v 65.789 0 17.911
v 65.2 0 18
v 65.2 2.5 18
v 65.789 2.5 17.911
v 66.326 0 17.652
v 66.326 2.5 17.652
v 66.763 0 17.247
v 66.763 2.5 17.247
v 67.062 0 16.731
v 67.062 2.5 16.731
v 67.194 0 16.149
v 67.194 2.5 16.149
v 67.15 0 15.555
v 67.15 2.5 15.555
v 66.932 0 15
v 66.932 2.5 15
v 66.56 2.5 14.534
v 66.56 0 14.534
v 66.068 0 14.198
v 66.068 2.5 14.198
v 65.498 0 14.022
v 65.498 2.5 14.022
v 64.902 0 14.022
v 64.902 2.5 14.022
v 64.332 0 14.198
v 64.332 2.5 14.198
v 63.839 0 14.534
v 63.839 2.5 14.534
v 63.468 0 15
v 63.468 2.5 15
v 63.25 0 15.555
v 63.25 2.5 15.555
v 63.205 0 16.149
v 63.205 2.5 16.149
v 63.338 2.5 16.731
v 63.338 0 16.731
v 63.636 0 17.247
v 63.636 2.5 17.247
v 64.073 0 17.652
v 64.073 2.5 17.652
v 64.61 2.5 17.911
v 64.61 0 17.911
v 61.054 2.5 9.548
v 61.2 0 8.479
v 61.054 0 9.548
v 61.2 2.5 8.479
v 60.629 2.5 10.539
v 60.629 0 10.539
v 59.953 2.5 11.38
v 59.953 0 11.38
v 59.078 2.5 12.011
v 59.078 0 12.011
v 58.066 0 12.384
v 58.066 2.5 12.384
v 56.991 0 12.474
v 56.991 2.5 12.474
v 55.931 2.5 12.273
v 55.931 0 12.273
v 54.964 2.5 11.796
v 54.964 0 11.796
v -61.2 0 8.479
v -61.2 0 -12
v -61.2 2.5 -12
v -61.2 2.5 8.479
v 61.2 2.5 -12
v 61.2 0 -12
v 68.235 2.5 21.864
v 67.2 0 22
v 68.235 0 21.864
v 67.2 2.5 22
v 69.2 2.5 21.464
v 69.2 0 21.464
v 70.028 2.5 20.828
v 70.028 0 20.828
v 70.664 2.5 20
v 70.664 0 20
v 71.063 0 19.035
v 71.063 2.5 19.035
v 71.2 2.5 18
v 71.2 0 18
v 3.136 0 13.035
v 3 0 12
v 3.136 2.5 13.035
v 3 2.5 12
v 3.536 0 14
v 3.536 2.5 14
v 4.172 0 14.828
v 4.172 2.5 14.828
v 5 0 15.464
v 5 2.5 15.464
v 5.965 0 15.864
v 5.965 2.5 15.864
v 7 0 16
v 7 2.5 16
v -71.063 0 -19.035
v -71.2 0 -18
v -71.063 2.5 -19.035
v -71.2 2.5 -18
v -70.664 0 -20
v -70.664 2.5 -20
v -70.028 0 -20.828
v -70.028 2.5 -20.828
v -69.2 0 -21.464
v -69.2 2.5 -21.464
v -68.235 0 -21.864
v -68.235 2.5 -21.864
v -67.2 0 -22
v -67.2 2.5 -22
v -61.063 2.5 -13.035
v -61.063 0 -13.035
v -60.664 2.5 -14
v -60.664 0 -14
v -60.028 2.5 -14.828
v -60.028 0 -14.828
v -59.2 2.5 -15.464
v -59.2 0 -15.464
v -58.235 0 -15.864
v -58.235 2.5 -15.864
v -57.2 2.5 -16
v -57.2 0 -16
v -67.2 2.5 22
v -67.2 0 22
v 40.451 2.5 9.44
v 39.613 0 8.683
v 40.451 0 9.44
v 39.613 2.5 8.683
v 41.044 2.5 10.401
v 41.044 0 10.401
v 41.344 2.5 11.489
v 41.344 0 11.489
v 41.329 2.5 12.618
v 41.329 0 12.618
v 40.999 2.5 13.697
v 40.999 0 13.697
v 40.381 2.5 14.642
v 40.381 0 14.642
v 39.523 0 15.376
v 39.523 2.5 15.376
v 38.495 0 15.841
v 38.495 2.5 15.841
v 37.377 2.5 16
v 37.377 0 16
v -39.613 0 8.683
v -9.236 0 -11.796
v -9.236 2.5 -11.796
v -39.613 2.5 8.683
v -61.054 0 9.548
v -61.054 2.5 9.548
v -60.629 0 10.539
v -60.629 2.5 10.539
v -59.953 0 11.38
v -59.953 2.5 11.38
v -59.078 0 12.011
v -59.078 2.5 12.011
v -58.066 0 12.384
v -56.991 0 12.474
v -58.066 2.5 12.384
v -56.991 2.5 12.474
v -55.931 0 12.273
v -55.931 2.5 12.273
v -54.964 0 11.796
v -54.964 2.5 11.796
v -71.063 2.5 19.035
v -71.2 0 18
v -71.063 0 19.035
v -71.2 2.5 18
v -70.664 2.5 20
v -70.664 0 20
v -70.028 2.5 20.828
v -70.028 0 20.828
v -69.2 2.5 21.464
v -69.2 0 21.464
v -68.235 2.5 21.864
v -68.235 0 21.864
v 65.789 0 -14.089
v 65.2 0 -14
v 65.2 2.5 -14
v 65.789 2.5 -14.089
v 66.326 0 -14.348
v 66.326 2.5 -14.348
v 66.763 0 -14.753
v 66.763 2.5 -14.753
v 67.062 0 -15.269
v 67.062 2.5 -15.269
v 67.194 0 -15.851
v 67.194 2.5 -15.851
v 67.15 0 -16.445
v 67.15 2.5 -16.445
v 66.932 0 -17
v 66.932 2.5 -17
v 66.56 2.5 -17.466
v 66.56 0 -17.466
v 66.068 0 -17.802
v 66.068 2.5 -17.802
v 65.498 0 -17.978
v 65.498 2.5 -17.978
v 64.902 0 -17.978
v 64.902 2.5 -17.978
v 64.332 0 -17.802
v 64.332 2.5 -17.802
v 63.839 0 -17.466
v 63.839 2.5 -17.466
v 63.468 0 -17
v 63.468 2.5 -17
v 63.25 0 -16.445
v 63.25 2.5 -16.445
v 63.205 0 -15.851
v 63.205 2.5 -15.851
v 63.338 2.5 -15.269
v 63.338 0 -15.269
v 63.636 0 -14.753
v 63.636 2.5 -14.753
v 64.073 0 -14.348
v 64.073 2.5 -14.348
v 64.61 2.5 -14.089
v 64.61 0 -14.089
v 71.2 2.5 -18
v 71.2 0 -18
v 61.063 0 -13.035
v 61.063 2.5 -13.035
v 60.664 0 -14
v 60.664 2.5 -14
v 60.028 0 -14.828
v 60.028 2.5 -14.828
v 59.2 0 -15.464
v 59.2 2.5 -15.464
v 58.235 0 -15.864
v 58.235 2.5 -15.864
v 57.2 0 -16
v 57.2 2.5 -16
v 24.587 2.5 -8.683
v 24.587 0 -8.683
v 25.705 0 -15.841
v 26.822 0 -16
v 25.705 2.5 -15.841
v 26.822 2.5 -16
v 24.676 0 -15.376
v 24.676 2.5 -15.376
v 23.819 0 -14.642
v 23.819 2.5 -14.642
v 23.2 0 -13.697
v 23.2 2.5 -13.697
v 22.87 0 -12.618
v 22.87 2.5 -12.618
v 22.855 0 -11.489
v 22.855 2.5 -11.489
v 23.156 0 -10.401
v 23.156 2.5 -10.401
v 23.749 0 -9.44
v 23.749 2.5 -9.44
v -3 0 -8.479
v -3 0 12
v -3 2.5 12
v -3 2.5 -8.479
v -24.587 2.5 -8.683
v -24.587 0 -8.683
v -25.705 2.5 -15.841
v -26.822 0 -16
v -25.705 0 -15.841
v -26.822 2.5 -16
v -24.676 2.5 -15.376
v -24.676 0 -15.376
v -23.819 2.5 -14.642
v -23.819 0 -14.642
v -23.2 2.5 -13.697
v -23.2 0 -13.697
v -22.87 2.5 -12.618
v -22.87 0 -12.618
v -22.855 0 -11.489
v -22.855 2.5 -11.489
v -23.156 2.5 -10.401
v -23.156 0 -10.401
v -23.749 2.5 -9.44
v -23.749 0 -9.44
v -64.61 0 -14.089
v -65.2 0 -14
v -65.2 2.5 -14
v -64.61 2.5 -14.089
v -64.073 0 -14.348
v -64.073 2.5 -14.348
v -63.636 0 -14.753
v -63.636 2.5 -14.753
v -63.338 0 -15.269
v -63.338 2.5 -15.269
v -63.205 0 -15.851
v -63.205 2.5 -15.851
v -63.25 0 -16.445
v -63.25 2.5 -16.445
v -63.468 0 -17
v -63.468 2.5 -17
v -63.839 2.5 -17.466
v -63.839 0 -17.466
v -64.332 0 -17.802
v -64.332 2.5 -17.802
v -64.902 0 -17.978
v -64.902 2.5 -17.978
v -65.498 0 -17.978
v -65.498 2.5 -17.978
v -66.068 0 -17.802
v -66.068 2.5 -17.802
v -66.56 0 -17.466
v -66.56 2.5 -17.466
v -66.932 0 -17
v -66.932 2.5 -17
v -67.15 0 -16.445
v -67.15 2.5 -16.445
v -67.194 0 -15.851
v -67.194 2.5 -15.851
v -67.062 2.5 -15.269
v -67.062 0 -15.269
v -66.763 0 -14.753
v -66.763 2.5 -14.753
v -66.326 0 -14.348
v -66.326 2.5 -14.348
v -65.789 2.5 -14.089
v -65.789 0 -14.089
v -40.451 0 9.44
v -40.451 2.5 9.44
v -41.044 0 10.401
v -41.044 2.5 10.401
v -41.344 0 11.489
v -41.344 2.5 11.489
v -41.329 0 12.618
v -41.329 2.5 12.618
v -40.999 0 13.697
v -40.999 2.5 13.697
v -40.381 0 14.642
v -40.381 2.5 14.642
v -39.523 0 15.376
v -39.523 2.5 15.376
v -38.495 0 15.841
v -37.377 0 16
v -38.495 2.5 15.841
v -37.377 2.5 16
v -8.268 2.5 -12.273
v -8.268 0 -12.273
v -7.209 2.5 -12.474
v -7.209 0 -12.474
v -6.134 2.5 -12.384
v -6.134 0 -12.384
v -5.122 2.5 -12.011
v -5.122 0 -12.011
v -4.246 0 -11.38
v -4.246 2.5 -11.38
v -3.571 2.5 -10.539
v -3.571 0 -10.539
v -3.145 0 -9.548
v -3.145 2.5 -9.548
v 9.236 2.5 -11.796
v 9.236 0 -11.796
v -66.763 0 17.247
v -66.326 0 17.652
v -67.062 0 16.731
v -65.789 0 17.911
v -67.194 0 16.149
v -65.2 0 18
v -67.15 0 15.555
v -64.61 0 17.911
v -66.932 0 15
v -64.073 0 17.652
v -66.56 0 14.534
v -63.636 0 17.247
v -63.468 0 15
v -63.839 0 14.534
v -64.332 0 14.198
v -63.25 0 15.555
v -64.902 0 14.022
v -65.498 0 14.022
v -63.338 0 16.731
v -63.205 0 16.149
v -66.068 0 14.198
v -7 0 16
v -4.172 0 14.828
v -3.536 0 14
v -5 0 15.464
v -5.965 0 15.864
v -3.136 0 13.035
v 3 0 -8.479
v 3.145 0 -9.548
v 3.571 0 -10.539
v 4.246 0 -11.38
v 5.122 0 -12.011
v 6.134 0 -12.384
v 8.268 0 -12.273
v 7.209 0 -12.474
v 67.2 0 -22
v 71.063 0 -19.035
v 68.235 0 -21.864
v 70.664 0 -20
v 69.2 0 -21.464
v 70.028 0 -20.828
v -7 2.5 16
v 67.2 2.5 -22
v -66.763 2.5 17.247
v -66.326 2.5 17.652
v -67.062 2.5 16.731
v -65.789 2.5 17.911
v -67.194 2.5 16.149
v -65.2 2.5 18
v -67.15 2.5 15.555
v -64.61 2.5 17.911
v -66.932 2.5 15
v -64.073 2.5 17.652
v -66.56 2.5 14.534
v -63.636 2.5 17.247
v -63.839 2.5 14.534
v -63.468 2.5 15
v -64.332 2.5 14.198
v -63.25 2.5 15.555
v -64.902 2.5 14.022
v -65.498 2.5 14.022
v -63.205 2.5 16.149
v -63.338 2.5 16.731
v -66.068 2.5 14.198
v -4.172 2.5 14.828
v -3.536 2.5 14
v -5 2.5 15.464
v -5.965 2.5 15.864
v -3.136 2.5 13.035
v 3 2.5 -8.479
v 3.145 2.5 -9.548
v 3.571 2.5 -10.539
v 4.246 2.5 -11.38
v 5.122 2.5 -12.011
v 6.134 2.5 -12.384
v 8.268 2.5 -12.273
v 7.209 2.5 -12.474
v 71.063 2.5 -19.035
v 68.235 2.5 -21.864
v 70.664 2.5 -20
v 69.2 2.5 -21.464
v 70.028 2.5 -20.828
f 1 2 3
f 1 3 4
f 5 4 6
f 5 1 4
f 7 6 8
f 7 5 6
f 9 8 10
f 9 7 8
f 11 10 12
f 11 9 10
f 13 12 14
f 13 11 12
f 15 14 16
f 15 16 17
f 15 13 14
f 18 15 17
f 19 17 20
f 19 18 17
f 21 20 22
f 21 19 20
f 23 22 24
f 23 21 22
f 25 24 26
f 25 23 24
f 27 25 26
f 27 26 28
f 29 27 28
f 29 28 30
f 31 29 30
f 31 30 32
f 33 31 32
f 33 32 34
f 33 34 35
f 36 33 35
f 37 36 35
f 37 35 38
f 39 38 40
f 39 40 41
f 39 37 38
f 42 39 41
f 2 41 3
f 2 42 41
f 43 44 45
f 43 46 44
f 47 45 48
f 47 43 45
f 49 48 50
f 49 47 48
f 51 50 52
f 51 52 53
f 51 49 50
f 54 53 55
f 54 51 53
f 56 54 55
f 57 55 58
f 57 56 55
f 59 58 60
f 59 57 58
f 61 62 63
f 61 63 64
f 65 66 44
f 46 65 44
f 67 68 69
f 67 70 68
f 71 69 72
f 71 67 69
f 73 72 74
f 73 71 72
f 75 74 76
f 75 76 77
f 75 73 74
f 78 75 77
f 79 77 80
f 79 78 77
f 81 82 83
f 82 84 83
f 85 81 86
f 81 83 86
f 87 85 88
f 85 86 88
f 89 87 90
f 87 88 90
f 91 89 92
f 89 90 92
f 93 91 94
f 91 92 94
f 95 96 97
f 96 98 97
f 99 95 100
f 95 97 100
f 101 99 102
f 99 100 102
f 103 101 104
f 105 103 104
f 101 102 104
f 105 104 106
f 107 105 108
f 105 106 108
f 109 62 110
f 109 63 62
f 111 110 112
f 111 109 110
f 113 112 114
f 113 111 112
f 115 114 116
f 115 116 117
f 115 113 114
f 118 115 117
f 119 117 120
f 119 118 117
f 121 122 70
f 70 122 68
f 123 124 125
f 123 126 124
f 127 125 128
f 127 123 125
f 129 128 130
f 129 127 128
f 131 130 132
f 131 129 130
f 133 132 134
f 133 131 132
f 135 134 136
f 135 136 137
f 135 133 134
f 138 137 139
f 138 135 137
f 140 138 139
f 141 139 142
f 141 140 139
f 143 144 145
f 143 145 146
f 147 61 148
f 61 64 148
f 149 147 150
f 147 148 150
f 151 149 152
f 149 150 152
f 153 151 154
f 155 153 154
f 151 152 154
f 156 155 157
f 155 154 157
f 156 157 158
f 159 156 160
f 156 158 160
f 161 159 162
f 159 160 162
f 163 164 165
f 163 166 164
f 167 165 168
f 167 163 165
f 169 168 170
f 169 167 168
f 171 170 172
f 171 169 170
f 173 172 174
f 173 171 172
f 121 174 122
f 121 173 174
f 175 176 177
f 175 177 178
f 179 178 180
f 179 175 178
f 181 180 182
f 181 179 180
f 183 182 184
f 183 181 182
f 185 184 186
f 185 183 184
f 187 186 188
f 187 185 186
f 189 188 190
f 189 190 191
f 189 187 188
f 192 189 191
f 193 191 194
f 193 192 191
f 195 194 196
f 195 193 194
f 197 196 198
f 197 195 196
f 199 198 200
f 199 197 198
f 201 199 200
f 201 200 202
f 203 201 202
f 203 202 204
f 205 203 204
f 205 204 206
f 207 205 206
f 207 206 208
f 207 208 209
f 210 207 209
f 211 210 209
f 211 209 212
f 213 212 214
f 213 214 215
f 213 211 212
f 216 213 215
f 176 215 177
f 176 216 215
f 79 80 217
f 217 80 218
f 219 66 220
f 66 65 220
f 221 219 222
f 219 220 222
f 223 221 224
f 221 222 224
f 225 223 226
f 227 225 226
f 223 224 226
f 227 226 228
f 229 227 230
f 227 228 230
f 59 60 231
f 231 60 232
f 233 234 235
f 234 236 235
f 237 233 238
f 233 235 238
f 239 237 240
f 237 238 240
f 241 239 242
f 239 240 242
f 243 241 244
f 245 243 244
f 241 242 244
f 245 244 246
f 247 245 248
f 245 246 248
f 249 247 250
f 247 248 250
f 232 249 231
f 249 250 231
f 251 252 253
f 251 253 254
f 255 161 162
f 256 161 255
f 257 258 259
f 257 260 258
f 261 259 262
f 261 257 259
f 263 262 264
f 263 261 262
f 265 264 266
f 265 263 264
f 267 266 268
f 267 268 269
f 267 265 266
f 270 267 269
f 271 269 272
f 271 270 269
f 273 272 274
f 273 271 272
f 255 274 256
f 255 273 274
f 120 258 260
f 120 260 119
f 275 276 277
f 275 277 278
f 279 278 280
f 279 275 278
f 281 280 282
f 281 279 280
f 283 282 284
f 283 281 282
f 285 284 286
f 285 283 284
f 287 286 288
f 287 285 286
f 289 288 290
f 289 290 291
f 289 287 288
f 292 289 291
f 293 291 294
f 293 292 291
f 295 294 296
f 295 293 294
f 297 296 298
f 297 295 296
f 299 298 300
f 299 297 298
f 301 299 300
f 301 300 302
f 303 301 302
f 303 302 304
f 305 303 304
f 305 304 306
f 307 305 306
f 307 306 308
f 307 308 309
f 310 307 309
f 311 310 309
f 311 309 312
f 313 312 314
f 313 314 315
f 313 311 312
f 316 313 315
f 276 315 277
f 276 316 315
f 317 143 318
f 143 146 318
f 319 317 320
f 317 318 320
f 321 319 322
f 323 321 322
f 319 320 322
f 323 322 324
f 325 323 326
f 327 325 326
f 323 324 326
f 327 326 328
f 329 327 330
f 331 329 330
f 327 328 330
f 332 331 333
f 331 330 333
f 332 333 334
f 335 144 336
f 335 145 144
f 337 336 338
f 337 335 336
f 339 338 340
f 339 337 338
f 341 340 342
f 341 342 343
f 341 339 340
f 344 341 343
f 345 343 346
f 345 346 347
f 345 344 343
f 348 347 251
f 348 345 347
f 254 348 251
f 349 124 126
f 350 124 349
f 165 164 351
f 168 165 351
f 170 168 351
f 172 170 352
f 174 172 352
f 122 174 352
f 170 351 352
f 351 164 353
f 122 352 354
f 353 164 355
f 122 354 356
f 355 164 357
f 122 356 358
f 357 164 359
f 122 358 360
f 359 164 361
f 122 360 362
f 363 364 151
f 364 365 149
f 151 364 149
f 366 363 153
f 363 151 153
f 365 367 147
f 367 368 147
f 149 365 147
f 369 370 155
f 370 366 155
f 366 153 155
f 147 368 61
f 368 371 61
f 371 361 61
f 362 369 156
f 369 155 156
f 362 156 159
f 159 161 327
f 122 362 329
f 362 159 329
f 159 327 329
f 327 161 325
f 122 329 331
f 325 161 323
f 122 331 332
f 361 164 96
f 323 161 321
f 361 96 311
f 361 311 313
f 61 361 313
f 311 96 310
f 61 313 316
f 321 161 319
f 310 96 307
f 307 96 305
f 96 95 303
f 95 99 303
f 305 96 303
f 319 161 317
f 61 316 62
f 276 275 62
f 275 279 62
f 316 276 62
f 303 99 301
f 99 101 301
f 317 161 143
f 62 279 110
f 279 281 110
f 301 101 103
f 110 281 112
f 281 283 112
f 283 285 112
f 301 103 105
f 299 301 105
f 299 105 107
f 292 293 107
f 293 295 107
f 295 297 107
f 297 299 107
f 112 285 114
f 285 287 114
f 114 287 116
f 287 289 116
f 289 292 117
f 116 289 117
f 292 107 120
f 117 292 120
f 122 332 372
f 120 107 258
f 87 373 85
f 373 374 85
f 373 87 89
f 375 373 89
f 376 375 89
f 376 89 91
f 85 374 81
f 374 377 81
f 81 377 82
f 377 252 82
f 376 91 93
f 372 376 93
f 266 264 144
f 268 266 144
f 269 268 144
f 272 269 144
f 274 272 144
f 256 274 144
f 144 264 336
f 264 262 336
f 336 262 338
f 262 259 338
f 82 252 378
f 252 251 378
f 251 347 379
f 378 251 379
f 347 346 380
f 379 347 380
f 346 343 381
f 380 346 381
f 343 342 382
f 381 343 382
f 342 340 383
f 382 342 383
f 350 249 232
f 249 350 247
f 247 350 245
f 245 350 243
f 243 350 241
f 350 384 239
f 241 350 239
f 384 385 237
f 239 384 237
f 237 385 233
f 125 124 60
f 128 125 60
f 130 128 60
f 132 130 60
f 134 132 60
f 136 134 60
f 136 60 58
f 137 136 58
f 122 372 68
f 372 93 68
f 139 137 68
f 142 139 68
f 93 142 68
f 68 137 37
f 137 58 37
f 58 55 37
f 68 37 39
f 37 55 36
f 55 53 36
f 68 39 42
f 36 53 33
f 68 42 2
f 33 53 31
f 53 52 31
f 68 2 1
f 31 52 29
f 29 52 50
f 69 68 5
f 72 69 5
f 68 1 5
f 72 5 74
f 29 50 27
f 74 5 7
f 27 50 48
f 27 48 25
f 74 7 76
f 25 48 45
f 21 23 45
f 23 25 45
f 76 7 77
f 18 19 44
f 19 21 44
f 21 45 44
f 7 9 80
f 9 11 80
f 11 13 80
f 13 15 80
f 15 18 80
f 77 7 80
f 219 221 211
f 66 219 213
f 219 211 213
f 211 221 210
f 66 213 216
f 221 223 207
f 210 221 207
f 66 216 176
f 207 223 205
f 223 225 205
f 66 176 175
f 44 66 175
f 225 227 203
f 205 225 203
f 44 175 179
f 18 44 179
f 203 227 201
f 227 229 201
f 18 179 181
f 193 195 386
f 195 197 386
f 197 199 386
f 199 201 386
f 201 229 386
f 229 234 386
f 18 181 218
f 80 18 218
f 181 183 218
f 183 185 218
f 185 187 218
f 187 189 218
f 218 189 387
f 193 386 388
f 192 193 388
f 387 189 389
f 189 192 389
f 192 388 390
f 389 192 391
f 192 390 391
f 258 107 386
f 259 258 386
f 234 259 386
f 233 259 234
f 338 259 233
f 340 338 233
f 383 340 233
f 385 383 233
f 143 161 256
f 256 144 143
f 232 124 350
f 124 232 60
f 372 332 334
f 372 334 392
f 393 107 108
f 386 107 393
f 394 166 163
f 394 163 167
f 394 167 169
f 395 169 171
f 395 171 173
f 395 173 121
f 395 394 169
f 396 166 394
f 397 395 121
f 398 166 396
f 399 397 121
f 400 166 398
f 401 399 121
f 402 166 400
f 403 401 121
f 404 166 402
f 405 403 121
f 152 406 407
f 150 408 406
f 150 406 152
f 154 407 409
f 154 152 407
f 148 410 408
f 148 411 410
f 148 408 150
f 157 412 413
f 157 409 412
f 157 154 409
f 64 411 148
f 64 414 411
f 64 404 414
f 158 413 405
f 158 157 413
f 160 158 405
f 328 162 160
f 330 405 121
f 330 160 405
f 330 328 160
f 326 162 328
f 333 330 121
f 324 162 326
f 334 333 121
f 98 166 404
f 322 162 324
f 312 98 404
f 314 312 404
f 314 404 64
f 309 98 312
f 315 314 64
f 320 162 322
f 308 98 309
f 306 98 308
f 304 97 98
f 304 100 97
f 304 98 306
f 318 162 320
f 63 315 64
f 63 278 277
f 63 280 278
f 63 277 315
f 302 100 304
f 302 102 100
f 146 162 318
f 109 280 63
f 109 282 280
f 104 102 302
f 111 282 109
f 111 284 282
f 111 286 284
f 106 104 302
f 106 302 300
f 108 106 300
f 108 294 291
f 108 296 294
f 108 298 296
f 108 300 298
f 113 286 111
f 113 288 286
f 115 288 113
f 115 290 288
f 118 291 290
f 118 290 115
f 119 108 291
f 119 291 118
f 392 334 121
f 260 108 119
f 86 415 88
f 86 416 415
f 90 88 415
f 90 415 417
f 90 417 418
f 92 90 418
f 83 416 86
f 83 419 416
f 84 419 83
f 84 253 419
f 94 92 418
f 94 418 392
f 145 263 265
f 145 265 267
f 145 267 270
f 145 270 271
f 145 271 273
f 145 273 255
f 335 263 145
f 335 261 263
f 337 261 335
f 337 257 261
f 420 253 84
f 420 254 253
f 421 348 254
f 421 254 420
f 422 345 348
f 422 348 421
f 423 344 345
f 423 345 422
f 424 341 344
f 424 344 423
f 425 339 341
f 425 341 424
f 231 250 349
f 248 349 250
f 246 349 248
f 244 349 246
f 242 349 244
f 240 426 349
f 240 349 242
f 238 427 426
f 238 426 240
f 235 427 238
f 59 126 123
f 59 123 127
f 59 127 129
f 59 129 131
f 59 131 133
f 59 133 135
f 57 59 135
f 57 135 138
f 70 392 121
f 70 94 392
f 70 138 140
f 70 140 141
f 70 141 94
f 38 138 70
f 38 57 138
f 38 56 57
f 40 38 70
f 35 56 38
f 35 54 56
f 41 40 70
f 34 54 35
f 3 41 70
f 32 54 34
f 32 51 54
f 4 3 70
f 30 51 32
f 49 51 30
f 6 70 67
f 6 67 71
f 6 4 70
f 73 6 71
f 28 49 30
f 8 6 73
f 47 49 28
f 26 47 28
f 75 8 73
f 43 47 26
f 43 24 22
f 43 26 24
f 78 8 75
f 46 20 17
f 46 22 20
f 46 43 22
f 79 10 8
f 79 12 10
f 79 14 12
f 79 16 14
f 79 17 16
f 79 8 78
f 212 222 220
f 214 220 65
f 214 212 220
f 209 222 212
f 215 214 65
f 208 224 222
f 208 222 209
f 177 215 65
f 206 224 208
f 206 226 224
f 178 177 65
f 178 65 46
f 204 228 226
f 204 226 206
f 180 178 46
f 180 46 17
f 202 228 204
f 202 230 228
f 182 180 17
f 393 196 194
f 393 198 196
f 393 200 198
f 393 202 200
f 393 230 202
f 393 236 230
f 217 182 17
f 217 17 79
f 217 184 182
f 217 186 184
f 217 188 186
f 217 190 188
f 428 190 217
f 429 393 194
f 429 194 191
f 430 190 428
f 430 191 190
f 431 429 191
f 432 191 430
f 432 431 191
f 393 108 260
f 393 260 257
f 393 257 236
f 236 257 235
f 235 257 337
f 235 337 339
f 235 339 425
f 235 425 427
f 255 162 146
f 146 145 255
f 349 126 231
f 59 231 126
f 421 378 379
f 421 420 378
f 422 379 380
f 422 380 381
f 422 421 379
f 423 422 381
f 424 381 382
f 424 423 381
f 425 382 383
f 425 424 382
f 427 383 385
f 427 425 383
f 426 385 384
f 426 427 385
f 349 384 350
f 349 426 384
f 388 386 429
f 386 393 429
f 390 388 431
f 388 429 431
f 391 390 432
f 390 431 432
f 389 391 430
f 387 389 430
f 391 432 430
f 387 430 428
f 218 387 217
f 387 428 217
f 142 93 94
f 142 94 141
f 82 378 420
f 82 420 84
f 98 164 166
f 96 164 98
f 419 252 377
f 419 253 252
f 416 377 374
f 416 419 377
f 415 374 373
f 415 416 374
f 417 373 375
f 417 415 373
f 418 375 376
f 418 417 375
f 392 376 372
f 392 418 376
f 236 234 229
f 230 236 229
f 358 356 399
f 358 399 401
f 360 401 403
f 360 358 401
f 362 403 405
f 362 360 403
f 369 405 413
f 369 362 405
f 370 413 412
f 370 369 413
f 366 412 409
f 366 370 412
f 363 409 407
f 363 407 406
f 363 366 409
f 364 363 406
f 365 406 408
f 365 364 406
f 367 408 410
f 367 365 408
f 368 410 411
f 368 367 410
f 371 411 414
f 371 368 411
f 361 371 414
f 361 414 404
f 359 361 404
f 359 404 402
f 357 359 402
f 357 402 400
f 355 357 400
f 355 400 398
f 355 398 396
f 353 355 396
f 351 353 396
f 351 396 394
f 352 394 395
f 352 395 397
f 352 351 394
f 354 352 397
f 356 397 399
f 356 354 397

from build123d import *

# Parameters (mm, degrees)
SKETCH1_W           = 142.3995226
SKETCH1_H           = 44
SKETCH1_R           = 2
BOSS_EXTRUDE1_DEPTH = 2.5
FILLET1_R           = 4


with BuildPart() as part:
    # Sketch1 → Boss-Extrude1 (new body)
    with BuildSketch(Plane(origin=(0, 0, 0), x_dir=(1, 0, 0), z_dir=(0, 1, 0))):
        Rectangle(SKETCH1_W, SKETCH1_H)
        with Locations(Location((-65.1997613, 16, 0), (0, 0, 270))):
            Circle(SKETCH1_R, mode=Mode.SUBTRACT)
        with Locations(Location((65.1997613, 16, 0), (0, 0, 270))):
            Circle(SKETCH1_R, mode=Mode.SUBTRACT)
        with Locations(Location((65.1997613, -16, 0), (0, 0, 270))):
            Circle(SKETCH1_R, mode=Mode.SUBTRACT)
        with Locations(Location((-65.1997613, -16, 0), (0, 0, 270))):
            Circle(SKETCH1_R, mode=Mode.SUBTRACT)
        Polygon((-61.1997613, 16), (-61.1997613, -16), (-13.733525191, 16), align=None, mode=Mode.SUBTRACT)
        Polygon((-3, 16), (-50.466236109, -16), (-3, -16), align=None, mode=Mode.SUBTRACT)
        Polygon((3, 16), (3, -16), (50.466236109, -16), align=None, mode=Mode.SUBTRACT)
        Polygon((61.1997613, -16), (13.733525191, 16), (61.1997613, 16), align=None, mode=Mode.SUBTRACT)
    extrude(amount=BOSS_EXTRUDE1_DEPTH)

    # Fillet1
    fillet1_edges = [part.edges().sort_by_distance(p)[0] for p in [
        (-13.733525191, 1.25, -16),
        (-61.1997613, 1.25, -16),
        (-61.1997613, 1.25, 16),
        (-3, 1.25, 16),
        (-3, 1.25, -16),
        (-50.466236109, 1.25, 16),
        (50.466236109, 1.25, 16),
        (3, 1.25, -16),
        (3, 1.25, 16),
        (61.1997613, 1.25, 16),
        (61.1997613, 1.25, -16),
        (13.733525191, 1.25, -16),
        (-71.1997613, 1.25, -22),
        (71.1997613, 1.25, -22),
        (71.1997613, 1.25, 22),
        (-71.1997613, 1.25, 22),
    ]]
    fillet(fillet1_edges, radius=FILLET1_R)


solid = part.part
